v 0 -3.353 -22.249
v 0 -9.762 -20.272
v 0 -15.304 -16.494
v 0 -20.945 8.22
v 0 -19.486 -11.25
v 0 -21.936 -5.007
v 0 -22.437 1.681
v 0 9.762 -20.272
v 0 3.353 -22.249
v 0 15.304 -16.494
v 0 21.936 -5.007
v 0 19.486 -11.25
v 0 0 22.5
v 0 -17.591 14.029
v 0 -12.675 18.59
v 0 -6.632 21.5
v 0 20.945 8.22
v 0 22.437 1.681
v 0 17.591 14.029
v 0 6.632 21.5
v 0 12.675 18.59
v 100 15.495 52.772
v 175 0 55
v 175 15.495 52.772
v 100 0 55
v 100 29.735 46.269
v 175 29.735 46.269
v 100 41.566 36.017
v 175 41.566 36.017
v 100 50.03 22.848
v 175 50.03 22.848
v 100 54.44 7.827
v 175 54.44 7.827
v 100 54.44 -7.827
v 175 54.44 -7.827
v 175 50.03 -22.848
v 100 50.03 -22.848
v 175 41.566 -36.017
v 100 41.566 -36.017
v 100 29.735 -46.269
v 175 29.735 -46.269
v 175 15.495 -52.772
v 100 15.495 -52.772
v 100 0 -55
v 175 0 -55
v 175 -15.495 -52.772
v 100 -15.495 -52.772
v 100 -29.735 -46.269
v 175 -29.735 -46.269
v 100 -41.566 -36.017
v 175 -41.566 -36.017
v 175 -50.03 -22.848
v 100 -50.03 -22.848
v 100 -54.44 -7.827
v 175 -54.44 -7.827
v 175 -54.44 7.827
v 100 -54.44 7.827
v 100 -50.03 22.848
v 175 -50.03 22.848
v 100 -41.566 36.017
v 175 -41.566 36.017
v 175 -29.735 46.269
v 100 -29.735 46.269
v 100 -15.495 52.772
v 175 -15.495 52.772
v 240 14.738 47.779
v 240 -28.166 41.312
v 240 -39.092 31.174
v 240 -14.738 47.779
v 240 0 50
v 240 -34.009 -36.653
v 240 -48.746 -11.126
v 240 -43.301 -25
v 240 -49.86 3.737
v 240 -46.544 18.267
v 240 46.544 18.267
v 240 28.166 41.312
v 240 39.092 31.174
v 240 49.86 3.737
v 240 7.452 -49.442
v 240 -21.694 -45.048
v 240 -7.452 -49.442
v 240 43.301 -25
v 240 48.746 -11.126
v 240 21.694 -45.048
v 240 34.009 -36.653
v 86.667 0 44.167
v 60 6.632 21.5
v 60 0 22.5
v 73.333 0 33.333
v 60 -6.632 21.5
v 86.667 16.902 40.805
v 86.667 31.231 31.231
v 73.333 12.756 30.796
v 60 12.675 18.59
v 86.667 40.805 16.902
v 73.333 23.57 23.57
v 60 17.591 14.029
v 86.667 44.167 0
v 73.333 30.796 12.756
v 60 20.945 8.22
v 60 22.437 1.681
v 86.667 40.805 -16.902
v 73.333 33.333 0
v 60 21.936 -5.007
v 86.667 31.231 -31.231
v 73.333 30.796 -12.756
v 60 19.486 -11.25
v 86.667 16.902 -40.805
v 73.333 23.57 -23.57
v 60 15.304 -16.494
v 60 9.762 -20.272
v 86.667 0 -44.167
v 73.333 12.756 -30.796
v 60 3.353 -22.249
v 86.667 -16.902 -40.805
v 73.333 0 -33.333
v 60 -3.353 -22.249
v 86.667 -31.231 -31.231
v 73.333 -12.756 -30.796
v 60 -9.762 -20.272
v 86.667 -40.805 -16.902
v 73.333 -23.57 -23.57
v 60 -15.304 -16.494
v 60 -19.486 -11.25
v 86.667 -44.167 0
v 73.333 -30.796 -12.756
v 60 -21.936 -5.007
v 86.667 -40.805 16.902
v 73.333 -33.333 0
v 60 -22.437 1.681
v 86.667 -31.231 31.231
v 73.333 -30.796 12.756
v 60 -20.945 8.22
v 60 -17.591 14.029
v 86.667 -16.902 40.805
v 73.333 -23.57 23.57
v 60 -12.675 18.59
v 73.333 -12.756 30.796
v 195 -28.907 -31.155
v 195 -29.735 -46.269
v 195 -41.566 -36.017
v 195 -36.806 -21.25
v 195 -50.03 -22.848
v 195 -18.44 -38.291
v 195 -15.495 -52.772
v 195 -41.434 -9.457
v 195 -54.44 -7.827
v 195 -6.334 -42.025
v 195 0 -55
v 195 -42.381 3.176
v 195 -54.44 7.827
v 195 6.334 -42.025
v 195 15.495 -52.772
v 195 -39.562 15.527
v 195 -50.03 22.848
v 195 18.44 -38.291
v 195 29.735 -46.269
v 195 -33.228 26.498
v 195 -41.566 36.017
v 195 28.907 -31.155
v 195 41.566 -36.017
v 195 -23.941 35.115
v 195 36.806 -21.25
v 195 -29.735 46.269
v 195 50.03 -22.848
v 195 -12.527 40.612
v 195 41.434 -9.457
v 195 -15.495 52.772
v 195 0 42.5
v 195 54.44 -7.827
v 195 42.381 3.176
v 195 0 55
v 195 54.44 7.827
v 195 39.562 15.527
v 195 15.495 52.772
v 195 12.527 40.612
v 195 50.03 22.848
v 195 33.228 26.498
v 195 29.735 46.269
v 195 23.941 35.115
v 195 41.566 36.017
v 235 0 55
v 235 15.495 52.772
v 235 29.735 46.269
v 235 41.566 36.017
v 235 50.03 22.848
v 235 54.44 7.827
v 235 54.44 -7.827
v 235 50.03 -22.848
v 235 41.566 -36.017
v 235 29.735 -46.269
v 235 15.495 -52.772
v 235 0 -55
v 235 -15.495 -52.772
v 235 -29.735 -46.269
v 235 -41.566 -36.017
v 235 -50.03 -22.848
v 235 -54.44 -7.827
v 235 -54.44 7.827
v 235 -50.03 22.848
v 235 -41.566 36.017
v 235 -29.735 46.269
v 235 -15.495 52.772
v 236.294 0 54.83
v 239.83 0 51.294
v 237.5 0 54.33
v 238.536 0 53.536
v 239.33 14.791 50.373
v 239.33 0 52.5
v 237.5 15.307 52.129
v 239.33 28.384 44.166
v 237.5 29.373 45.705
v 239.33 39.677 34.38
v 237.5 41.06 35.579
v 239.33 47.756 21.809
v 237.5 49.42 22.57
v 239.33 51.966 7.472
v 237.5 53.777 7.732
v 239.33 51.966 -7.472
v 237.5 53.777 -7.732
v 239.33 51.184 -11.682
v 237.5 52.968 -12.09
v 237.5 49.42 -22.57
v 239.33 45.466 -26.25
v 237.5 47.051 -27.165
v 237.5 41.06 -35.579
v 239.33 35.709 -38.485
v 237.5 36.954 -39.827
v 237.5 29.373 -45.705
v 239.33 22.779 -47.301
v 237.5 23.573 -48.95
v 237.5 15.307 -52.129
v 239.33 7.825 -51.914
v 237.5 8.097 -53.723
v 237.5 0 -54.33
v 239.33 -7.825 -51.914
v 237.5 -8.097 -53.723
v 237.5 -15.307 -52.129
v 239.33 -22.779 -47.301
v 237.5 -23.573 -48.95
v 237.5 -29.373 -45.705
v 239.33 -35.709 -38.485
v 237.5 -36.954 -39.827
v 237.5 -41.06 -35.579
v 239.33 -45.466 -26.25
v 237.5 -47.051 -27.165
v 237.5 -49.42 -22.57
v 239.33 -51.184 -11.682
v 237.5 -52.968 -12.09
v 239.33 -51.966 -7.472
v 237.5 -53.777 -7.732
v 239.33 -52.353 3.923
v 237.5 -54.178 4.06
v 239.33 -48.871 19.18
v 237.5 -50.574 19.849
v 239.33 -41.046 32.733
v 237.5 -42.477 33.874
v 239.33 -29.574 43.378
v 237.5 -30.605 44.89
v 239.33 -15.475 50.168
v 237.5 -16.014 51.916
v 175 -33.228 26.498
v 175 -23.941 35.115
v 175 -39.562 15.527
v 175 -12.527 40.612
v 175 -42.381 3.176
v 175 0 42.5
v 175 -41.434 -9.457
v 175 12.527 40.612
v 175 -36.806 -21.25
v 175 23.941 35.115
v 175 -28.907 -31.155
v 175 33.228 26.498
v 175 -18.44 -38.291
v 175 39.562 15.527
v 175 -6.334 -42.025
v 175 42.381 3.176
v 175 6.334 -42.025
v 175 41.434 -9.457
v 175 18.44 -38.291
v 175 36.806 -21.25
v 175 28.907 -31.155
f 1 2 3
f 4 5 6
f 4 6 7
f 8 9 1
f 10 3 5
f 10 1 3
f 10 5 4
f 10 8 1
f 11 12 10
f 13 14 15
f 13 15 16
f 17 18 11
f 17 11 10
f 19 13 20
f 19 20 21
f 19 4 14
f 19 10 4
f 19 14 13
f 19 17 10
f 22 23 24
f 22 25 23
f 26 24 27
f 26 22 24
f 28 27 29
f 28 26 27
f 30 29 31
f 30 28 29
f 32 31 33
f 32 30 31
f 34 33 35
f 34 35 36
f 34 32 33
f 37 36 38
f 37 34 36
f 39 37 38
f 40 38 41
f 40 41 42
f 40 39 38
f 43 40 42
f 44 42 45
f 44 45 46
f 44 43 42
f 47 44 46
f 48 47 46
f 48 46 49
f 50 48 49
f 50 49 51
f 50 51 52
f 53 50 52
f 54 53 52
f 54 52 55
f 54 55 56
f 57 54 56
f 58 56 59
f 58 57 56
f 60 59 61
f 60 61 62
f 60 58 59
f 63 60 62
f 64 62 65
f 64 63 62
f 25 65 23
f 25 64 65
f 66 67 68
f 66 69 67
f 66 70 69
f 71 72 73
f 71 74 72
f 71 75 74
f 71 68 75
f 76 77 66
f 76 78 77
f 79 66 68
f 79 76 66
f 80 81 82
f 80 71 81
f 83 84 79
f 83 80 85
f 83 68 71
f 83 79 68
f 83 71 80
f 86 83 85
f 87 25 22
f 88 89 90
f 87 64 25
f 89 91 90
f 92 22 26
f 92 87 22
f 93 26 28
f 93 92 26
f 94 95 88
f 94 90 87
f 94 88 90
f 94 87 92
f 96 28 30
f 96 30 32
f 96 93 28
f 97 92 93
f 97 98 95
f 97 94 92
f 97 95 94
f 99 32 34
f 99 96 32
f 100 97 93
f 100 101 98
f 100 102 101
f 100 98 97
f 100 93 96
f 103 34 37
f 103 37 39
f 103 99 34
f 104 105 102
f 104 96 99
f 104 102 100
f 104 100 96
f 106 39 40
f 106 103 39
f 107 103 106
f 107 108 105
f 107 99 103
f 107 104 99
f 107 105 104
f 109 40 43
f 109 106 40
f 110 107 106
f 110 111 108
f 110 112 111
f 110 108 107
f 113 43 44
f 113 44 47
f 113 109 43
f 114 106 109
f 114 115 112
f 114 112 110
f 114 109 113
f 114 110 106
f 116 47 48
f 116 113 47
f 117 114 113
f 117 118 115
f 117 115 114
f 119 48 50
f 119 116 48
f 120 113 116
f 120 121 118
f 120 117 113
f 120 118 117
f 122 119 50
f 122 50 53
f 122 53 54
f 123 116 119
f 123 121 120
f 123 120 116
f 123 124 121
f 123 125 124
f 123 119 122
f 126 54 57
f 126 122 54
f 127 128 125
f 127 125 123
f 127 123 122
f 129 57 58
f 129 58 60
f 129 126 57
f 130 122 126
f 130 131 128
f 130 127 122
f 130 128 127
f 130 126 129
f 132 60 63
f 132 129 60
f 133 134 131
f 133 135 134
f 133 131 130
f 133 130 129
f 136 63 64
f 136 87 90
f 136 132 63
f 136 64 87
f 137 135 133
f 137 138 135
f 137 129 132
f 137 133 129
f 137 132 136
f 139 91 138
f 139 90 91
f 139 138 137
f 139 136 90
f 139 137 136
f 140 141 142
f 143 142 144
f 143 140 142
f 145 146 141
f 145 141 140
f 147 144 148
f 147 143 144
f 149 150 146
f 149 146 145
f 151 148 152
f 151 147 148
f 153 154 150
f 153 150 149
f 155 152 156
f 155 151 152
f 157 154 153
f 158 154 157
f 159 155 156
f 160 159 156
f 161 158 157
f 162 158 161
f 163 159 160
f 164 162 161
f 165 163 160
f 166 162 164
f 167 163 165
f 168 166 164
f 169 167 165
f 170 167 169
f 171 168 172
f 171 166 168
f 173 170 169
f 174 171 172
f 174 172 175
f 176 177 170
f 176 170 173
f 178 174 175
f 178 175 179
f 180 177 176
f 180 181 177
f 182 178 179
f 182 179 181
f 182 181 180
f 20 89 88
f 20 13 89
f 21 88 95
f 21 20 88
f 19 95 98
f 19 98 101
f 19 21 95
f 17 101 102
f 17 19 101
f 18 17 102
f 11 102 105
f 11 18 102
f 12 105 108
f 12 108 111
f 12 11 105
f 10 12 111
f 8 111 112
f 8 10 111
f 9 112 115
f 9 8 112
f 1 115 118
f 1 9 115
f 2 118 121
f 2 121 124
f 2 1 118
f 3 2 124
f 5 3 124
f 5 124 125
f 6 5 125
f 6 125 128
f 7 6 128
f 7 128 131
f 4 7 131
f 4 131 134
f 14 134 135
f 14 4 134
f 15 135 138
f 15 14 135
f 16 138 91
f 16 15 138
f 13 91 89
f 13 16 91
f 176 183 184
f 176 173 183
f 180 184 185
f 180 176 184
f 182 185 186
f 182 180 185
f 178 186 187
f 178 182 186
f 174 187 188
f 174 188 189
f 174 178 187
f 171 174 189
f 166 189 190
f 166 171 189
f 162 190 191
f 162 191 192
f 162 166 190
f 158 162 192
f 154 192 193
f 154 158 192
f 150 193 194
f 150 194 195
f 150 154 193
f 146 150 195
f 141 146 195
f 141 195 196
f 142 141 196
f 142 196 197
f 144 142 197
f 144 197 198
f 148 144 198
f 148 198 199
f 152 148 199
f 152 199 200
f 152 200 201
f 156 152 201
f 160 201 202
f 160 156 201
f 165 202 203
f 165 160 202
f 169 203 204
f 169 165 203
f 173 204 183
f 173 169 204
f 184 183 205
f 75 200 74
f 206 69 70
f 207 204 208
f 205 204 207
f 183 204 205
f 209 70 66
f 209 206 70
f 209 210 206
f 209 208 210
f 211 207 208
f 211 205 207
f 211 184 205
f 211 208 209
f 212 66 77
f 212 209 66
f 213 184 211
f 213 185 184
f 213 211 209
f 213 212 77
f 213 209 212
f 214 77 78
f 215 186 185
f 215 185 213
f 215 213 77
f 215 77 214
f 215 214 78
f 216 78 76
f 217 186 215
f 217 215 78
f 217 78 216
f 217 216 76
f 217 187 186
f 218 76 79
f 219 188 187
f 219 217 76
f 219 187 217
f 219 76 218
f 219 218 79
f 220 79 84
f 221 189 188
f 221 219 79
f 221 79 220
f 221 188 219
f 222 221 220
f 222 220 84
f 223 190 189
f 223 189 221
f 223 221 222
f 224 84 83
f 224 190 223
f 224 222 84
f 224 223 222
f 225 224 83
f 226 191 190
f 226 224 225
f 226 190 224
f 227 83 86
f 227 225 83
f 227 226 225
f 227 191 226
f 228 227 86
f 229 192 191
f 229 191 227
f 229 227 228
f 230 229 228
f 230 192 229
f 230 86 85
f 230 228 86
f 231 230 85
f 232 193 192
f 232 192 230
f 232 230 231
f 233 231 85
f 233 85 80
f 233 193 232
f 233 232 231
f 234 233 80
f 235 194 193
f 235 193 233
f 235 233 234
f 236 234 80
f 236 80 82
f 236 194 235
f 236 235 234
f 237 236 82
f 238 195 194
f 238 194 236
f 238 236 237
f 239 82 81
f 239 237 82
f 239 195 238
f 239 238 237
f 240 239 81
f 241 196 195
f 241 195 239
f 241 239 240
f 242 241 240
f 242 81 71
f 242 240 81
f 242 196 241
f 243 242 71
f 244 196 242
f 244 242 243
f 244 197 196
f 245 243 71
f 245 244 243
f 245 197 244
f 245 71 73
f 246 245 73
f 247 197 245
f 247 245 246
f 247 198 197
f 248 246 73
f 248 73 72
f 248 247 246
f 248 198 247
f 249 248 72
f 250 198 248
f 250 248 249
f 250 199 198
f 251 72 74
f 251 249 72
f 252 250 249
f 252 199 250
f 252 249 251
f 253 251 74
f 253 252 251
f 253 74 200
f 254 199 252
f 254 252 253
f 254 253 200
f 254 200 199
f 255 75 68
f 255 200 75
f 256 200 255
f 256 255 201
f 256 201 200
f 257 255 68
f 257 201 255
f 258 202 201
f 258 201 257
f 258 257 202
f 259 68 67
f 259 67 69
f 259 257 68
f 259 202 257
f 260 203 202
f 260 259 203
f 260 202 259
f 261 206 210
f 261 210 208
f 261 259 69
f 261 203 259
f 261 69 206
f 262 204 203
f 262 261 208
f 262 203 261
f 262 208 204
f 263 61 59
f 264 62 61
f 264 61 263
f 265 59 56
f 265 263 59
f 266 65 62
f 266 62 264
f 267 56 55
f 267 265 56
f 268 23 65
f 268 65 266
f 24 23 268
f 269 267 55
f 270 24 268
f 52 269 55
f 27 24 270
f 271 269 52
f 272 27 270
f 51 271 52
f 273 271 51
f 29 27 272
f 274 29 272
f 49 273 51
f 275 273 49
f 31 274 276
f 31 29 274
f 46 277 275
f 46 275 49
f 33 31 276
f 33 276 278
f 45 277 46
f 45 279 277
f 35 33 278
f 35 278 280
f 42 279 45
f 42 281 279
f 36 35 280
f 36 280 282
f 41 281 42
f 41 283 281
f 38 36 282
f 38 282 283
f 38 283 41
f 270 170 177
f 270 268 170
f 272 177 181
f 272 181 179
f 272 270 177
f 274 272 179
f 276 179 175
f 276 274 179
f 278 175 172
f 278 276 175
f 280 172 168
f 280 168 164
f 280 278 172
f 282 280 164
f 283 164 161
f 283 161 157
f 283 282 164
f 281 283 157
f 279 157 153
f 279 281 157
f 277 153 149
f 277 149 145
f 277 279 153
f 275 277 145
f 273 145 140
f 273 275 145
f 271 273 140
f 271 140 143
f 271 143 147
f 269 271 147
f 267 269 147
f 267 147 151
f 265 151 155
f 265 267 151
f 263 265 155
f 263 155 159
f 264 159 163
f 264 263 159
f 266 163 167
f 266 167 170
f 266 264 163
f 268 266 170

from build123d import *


with BuildPart() as f1:
    # F0 (on Front) → F1 (revolve)
    with BuildSketch(Plane.XZ):
        with BuildLine():
            Line((0, 22.5), (0, 0))
            Line((0, 0), (240, 0))
            Line((240, 0), (240, 50))
            ThreePointArc((240, 50), (238.535534, 53.535534), (235, 55))
            Line((235, 55), (195, 55))
            Line((195, 55), (195, 42.5))
            Line((195, 42.5), (175, 42.5))
            Line((175, 42.5), (175, 55))
            Line((175, 55), (100, 55))
            Line((100, 55), (60, 22.5))
            Line((60, 22.5), (0, 22.5))
        make_face()
    revolve(axis=Axis((-20.114416, 0, 0), (-1, 0, 0)))


solid = f1.part
